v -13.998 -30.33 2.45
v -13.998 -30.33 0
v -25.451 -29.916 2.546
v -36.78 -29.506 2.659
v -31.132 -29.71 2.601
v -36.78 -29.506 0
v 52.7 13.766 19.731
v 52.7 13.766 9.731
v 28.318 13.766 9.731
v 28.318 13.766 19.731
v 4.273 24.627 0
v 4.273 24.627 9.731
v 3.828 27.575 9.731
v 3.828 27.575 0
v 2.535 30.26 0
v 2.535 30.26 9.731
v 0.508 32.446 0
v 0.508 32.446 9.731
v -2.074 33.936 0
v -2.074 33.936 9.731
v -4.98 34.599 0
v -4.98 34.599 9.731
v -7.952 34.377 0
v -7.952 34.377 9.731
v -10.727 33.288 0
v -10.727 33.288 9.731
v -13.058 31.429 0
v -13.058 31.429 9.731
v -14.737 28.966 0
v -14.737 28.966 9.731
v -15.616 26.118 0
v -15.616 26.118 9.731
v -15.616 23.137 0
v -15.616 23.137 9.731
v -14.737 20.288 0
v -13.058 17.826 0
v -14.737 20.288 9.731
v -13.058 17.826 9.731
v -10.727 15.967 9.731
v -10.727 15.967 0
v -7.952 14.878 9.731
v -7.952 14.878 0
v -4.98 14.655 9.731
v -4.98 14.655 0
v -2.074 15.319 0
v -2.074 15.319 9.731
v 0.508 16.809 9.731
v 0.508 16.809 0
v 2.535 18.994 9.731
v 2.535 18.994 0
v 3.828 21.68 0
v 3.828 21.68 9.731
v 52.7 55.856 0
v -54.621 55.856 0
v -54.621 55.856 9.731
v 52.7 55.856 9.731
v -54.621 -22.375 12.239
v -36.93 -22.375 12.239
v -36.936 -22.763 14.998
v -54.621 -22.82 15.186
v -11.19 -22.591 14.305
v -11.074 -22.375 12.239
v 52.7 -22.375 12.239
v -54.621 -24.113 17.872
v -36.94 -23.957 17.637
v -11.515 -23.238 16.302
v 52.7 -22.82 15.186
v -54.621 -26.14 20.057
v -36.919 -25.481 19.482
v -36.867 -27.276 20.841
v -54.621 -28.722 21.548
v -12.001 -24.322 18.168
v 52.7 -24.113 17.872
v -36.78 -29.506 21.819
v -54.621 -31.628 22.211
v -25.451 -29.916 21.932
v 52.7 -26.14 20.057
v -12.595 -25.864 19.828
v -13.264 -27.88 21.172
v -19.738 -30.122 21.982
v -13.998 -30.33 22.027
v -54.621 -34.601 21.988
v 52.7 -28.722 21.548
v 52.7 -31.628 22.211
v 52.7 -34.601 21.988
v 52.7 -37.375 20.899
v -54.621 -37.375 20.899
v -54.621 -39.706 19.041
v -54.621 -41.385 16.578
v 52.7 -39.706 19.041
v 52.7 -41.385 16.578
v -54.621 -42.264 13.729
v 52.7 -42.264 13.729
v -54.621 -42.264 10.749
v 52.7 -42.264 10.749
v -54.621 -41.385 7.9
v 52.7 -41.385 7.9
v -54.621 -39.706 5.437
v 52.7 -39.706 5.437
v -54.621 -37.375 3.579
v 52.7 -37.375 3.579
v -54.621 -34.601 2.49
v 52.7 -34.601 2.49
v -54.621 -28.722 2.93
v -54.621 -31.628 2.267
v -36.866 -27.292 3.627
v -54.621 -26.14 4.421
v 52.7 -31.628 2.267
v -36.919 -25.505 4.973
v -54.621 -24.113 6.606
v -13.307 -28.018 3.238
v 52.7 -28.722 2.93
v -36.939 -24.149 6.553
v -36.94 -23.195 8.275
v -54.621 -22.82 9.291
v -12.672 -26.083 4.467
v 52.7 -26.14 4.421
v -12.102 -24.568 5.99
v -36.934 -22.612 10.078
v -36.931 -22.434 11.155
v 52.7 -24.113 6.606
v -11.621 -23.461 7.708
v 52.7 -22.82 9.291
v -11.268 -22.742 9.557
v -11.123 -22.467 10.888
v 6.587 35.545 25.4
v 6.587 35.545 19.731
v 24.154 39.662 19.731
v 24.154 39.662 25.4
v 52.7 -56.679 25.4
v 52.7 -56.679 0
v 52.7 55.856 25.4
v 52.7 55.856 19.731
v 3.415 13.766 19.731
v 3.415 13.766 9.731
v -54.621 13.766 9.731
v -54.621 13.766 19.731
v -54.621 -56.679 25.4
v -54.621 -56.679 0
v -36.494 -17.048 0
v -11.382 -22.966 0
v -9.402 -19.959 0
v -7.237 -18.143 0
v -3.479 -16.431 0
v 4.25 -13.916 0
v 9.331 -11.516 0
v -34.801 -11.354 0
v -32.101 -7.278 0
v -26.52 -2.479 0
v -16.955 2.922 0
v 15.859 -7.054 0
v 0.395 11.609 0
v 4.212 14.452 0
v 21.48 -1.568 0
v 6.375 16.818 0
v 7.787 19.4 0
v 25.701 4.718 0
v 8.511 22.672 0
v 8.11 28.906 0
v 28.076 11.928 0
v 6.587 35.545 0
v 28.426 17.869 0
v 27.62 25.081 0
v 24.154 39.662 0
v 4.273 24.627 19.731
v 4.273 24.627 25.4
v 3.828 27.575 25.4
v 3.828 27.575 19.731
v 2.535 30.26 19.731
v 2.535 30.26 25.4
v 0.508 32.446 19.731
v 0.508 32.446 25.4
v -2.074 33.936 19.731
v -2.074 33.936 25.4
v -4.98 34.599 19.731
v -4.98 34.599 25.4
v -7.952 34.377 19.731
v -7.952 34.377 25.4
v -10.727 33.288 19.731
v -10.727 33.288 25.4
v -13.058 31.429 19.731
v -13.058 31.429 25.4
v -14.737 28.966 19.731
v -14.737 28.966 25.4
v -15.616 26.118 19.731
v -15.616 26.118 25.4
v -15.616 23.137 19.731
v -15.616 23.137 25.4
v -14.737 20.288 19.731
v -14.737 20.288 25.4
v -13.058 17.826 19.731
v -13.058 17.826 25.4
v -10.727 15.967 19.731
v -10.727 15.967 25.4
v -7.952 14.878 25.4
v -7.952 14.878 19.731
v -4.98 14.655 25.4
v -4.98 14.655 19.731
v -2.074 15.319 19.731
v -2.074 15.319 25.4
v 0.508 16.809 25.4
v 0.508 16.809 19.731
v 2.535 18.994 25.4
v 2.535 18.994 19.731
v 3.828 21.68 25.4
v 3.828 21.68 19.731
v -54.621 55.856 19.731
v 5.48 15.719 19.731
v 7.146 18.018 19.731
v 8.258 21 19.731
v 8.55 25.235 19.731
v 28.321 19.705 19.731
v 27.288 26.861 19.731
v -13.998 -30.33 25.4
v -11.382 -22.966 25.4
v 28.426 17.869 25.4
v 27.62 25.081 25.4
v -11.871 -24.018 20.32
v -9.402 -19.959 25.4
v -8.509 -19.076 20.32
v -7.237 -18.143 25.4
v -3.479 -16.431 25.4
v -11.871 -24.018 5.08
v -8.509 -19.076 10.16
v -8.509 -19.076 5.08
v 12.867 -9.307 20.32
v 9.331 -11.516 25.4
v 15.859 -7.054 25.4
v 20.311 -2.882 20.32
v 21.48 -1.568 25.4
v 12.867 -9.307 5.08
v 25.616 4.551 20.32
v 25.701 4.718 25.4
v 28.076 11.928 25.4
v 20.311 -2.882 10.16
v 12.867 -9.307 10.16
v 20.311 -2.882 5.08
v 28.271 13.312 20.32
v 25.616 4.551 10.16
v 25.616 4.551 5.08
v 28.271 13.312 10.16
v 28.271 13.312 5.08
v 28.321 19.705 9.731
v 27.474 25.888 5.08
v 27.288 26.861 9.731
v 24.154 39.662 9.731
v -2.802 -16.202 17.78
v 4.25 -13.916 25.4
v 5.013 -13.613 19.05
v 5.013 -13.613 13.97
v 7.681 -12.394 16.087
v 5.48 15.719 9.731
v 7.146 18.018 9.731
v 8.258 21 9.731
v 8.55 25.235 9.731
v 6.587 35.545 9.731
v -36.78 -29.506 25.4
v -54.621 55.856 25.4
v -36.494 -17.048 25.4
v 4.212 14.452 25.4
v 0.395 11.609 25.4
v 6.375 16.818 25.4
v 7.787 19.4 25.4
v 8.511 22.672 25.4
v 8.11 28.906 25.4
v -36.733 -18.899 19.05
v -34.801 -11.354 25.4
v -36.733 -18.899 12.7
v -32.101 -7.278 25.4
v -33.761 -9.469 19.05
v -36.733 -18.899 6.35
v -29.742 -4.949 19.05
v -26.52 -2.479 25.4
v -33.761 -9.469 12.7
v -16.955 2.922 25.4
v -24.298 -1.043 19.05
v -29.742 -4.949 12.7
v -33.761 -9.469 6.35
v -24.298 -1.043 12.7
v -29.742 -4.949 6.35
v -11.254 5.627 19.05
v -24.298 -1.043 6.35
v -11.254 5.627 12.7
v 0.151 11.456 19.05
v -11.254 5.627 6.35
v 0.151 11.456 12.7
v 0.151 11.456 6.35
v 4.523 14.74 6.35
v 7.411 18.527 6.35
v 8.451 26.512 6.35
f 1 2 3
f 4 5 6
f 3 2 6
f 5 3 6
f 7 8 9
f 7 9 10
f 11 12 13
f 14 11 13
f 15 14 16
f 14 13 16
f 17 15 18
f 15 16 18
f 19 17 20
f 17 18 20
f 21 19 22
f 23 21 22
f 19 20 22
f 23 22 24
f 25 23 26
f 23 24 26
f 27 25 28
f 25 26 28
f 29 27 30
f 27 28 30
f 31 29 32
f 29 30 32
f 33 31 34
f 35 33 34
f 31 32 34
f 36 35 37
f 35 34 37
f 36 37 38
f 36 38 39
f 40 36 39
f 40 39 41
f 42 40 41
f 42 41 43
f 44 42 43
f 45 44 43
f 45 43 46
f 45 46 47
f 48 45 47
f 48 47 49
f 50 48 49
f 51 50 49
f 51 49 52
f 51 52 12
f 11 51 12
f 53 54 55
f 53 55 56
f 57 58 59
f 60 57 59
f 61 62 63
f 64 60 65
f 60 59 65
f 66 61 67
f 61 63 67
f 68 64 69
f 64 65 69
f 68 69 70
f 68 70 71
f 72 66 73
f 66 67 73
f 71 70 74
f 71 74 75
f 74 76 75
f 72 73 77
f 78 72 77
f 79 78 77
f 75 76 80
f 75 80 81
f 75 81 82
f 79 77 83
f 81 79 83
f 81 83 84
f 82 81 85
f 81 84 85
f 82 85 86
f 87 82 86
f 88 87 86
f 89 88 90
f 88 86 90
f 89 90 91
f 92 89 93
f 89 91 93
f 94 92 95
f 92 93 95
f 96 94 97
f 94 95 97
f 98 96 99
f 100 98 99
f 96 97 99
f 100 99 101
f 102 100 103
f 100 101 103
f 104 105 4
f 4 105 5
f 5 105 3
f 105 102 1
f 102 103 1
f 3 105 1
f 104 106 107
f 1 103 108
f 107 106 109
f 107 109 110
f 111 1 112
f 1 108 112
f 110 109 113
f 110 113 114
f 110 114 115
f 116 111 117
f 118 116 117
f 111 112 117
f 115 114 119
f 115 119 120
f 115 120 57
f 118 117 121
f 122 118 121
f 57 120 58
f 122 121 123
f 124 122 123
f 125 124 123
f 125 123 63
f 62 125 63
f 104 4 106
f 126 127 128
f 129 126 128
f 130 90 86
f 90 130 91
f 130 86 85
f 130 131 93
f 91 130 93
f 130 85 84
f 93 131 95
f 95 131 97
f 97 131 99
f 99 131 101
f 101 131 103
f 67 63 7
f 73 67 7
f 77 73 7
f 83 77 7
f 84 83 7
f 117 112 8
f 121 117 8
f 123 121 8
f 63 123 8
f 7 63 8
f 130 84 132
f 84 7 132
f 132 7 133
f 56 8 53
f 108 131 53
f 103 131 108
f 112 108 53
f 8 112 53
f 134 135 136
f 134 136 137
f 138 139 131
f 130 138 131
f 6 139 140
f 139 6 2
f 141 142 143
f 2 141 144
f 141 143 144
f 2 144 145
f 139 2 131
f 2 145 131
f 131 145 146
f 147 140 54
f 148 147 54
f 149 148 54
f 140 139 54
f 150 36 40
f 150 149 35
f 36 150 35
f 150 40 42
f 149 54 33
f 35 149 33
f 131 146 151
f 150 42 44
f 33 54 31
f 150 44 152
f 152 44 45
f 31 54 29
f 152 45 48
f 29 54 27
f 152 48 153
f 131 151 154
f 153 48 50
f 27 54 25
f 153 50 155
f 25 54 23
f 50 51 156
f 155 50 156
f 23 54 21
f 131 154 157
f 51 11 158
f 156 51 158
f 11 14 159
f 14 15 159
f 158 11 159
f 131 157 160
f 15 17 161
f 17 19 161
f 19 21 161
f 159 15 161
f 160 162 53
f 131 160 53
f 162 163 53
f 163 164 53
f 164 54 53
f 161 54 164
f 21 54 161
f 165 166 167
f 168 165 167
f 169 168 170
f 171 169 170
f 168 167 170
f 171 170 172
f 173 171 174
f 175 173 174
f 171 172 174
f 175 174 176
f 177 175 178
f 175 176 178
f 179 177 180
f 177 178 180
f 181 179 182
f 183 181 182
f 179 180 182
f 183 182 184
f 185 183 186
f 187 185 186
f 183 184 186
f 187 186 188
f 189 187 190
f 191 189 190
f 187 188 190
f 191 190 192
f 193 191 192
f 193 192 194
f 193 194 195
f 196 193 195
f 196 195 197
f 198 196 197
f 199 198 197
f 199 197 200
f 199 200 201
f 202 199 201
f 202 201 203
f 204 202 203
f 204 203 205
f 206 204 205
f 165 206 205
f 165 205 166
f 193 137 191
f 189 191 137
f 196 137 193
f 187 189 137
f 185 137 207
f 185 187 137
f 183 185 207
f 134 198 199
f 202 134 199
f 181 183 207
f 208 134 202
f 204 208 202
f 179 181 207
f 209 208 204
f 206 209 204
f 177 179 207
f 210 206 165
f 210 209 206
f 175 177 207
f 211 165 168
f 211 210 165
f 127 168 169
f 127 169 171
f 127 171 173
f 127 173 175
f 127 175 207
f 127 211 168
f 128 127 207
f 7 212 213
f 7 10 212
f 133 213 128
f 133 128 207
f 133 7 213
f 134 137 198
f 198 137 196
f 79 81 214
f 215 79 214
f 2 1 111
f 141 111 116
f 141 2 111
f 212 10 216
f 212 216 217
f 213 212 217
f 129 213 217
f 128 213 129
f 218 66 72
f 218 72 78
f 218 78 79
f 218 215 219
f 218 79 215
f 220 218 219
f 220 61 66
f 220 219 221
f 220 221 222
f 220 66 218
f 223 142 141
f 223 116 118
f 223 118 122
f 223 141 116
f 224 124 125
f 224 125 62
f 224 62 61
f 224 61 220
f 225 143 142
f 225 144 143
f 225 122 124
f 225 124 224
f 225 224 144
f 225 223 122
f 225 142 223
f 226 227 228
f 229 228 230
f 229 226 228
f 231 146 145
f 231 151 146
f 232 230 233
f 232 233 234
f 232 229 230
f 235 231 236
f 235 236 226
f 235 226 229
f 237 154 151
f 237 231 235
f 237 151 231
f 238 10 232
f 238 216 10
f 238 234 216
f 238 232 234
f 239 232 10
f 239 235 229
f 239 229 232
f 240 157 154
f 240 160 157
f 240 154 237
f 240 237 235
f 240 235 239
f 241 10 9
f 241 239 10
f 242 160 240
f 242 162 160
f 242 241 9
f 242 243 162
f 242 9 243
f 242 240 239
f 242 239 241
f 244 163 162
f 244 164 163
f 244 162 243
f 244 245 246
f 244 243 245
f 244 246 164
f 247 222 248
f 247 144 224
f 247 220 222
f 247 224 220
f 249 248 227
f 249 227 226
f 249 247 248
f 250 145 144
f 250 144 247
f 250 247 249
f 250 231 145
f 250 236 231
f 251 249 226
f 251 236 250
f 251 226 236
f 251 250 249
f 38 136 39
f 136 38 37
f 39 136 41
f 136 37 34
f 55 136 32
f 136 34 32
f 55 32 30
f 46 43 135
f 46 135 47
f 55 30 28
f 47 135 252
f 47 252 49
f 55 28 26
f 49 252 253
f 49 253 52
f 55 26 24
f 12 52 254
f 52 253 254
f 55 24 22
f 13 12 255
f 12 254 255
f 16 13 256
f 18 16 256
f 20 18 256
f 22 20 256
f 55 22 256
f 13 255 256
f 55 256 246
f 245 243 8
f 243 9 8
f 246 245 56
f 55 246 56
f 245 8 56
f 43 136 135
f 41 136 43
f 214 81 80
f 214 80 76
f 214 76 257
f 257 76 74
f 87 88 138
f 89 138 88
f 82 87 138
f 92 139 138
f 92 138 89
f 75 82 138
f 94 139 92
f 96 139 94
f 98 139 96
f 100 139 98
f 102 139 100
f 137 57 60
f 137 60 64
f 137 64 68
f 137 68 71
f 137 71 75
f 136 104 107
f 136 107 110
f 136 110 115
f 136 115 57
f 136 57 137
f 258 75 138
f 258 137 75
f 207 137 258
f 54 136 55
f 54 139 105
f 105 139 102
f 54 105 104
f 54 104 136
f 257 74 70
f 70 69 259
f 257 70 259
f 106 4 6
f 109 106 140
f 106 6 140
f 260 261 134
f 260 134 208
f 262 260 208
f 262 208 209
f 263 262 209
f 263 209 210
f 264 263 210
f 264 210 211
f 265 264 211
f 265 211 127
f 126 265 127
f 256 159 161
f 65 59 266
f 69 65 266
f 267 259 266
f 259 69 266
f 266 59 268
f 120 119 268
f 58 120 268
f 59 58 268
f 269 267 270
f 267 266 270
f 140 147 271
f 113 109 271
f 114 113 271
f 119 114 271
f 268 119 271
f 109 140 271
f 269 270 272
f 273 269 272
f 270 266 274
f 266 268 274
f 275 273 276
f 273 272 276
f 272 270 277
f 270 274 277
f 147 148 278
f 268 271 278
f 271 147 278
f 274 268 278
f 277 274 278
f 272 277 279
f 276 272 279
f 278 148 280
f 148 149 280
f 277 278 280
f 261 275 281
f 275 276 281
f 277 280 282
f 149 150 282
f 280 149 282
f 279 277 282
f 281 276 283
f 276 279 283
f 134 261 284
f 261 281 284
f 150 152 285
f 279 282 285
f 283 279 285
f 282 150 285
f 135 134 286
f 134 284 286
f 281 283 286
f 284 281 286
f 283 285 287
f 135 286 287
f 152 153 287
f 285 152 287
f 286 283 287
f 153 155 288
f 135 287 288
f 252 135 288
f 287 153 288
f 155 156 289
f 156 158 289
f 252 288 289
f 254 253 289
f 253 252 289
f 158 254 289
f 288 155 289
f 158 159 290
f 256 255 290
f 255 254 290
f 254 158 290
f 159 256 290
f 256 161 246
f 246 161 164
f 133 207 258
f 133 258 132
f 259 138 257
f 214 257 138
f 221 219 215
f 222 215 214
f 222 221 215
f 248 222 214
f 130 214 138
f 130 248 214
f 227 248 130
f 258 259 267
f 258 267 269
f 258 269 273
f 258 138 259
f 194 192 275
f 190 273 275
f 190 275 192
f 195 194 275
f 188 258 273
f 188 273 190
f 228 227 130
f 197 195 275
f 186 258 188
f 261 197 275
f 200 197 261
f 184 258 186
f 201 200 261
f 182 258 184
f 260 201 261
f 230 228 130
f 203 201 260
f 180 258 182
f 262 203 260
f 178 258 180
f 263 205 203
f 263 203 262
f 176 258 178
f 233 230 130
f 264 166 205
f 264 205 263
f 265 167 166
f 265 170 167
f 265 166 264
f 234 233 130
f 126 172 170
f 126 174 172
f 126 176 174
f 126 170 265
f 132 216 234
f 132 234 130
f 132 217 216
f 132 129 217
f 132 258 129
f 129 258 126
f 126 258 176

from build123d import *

# Parameters (mm, degrees)
F0_W     = 107.320446521
F0_H     = 112.5355064869
F1_DEPTH = 25.4
F2_R     = 10
F2_W     = 44.1350700906
F2_H     = 10
F3_DEPTH = 107.321446621
F4_R     = 10
F5_DEPTH = 25.4010001


with BuildPart() as f1:
    # F0 (on Top) → F1 (new body)
    with BuildSketch(Plane.XY):
        with Locations((-0.9606685489, -0.4117153585)):
            Rectangle(F0_W, F0_H)
        with BuildLine():
            Line((-13.9983193949, -30.3296931088), (-36.7798954248, -29.5062605292))
            add(Edge.make_bspline(
                [(-36.7798954248, -29.5062605292), (-37.0737623342, -22.3038153757), (-37.7074826154, -6.7718333039), (-11.6101098174, 5.4940779058), (11.5229911211, 16.1858602813), (8.1523007319, 29.4068529306), (6.5874438733, 35.5447530746)],
                knots=[0, 0, 0, 0, 0.2420361752, 0.5219479572, 0.7780623755, 1, 1, 1, 1], degree=3))
            Line((6.5874438733, 35.5447530746), (24.1539627314, 39.6619029343))
            add(Edge.make_bspline(
                [(-13.9983193949, -30.3296931088), (-12.7174517336, -25.9697019043), (-10.0863175924, -17.0134903766), (5.2905439896, -15.0083142094), (21.4625052751, -3.7589083207), (31.1936947319, 13.367953183), (26.6480589275, 30.3462585247), (24.1539627314, 39.6619029343)],
                knots=[0, 0, 0, 0, 0.1678735533, 0.3448426804, 0.5534704946, 0.7549985109, 1, 1, 1, 1], degree=3))
        make_face(mode=Mode.SUBTRACT)
    extrude(amount=F1_DEPTH)

    # F2 (on face) → F3 (cut, through all)
    with BuildSketch(Plane.YZ.offset(52.6995547116)):
        with Locations((-32.3753028454, 12.2389346361)):
            Circle(F2_R)
        with Locations((35.833440075, 14.731259873)):
            Rectangle(F2_W, F2_H)
    extrude(amount=-F3_DEPTH, mode=Mode.SUBTRACT)

    # F4 (on face) → F5 (cut, through all)
    with BuildSketch(Plane.XY.offset(25.4)):
        with Locations((-5.7272729464, 24.6272739023)):
            Circle(F4_R)
    extrude(amount=-F5_DEPTH, mode=Mode.SUBTRACT)


solid = f1.part
